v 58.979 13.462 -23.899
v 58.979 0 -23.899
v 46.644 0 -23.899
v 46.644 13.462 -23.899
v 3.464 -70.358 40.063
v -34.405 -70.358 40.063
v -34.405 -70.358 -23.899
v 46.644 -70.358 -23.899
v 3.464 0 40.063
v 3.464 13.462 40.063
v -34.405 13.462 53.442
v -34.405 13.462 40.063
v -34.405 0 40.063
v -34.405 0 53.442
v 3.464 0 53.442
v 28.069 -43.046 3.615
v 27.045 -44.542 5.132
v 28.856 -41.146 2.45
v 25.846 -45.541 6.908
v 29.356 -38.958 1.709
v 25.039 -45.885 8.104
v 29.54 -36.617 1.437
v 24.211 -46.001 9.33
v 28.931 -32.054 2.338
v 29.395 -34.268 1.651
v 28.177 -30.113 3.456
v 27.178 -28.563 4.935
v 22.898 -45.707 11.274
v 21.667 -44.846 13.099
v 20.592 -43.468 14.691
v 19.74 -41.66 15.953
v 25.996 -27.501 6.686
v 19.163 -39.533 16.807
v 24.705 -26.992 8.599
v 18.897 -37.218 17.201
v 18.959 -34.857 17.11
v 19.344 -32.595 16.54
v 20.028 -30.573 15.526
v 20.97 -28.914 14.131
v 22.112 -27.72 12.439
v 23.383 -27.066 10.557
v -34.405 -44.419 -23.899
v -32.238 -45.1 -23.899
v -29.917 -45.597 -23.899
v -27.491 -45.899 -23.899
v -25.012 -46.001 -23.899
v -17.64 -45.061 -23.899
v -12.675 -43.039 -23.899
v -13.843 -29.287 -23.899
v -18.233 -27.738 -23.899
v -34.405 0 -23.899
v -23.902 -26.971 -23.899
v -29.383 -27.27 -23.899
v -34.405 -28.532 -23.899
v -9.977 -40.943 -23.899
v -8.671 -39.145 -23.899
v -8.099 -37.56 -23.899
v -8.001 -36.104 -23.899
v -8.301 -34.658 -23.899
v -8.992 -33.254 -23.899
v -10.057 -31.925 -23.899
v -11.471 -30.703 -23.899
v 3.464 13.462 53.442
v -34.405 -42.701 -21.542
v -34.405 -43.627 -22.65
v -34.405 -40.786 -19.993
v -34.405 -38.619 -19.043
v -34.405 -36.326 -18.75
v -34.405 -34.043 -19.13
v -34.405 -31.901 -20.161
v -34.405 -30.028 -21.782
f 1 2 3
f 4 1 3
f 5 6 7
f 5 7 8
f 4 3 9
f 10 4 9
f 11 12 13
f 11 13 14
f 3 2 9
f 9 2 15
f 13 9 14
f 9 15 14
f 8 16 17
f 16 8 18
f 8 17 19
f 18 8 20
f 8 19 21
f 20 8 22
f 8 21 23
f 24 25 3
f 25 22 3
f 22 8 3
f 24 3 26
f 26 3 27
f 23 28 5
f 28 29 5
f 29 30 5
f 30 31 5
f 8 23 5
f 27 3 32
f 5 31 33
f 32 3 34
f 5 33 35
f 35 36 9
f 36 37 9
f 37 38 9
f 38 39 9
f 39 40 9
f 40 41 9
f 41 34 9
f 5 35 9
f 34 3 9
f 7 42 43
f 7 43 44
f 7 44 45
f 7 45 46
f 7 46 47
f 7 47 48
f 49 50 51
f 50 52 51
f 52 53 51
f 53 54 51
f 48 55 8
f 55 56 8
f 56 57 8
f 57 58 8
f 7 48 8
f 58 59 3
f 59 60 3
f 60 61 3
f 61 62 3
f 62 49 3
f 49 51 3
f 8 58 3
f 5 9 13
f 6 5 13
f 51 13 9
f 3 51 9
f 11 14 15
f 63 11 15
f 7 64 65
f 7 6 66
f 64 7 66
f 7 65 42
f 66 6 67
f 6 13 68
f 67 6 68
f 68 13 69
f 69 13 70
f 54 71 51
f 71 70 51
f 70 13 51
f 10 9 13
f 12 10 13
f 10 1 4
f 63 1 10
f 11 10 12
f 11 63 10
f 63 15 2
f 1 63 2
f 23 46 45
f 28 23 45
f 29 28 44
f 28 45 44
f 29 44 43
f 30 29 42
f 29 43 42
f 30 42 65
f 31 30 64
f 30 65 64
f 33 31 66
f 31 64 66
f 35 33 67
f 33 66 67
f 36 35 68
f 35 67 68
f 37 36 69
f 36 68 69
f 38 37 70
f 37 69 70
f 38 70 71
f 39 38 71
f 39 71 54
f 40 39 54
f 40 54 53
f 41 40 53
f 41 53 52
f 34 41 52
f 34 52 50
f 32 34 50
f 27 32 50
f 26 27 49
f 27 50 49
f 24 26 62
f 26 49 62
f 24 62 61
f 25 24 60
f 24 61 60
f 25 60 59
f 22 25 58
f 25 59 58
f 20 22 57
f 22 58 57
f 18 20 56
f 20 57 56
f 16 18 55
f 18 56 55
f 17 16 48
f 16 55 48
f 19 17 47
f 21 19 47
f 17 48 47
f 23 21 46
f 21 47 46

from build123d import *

# Parameters (mm, degrees)
F1_DEPTH = 70.358
F3_D     = 19.05
F5_DEPTH = 13.462


with BuildPart() as f1:
    # F0 (on Front) → F1 (new body)
    with BuildSketch(Plane.XZ):
        Polygon((-34.405455, 40.062729), (-34.405455, -23.89909), (46.643633, -23.89909), (3.463636, 40.062729), align=None)
    extrude(amount=F1_DEPTH)

    # F3 (through all)
    with Locations(Plane(origin=(20.958035, 0, 14.148564), x_dir=(0, 1, 0), z_dir=(0.828814, 0, 0.559524))):
        with Locations((-36.475699, -5.813245)):
            Hole(F3_D / 2)


with BuildPart() as f5:
    # F4 (on face) → F5 (new body)
    with BuildSketch(Plane(origin=(0, 0, 0), x_dir=(-1, 0, 0), z_dir=(0, 1, 0))):
        Polygon((-3.463636, 40.062729), (34.405455, 40.062729), (34.405455, 53.442024), (-3.463636, 53.442024), (-58.979385, -23.89909), (-46.643633, -23.89909), align=None)
    extrude(amount=F5_DEPTH)


solid = Compound([f1.part, f5.part])
